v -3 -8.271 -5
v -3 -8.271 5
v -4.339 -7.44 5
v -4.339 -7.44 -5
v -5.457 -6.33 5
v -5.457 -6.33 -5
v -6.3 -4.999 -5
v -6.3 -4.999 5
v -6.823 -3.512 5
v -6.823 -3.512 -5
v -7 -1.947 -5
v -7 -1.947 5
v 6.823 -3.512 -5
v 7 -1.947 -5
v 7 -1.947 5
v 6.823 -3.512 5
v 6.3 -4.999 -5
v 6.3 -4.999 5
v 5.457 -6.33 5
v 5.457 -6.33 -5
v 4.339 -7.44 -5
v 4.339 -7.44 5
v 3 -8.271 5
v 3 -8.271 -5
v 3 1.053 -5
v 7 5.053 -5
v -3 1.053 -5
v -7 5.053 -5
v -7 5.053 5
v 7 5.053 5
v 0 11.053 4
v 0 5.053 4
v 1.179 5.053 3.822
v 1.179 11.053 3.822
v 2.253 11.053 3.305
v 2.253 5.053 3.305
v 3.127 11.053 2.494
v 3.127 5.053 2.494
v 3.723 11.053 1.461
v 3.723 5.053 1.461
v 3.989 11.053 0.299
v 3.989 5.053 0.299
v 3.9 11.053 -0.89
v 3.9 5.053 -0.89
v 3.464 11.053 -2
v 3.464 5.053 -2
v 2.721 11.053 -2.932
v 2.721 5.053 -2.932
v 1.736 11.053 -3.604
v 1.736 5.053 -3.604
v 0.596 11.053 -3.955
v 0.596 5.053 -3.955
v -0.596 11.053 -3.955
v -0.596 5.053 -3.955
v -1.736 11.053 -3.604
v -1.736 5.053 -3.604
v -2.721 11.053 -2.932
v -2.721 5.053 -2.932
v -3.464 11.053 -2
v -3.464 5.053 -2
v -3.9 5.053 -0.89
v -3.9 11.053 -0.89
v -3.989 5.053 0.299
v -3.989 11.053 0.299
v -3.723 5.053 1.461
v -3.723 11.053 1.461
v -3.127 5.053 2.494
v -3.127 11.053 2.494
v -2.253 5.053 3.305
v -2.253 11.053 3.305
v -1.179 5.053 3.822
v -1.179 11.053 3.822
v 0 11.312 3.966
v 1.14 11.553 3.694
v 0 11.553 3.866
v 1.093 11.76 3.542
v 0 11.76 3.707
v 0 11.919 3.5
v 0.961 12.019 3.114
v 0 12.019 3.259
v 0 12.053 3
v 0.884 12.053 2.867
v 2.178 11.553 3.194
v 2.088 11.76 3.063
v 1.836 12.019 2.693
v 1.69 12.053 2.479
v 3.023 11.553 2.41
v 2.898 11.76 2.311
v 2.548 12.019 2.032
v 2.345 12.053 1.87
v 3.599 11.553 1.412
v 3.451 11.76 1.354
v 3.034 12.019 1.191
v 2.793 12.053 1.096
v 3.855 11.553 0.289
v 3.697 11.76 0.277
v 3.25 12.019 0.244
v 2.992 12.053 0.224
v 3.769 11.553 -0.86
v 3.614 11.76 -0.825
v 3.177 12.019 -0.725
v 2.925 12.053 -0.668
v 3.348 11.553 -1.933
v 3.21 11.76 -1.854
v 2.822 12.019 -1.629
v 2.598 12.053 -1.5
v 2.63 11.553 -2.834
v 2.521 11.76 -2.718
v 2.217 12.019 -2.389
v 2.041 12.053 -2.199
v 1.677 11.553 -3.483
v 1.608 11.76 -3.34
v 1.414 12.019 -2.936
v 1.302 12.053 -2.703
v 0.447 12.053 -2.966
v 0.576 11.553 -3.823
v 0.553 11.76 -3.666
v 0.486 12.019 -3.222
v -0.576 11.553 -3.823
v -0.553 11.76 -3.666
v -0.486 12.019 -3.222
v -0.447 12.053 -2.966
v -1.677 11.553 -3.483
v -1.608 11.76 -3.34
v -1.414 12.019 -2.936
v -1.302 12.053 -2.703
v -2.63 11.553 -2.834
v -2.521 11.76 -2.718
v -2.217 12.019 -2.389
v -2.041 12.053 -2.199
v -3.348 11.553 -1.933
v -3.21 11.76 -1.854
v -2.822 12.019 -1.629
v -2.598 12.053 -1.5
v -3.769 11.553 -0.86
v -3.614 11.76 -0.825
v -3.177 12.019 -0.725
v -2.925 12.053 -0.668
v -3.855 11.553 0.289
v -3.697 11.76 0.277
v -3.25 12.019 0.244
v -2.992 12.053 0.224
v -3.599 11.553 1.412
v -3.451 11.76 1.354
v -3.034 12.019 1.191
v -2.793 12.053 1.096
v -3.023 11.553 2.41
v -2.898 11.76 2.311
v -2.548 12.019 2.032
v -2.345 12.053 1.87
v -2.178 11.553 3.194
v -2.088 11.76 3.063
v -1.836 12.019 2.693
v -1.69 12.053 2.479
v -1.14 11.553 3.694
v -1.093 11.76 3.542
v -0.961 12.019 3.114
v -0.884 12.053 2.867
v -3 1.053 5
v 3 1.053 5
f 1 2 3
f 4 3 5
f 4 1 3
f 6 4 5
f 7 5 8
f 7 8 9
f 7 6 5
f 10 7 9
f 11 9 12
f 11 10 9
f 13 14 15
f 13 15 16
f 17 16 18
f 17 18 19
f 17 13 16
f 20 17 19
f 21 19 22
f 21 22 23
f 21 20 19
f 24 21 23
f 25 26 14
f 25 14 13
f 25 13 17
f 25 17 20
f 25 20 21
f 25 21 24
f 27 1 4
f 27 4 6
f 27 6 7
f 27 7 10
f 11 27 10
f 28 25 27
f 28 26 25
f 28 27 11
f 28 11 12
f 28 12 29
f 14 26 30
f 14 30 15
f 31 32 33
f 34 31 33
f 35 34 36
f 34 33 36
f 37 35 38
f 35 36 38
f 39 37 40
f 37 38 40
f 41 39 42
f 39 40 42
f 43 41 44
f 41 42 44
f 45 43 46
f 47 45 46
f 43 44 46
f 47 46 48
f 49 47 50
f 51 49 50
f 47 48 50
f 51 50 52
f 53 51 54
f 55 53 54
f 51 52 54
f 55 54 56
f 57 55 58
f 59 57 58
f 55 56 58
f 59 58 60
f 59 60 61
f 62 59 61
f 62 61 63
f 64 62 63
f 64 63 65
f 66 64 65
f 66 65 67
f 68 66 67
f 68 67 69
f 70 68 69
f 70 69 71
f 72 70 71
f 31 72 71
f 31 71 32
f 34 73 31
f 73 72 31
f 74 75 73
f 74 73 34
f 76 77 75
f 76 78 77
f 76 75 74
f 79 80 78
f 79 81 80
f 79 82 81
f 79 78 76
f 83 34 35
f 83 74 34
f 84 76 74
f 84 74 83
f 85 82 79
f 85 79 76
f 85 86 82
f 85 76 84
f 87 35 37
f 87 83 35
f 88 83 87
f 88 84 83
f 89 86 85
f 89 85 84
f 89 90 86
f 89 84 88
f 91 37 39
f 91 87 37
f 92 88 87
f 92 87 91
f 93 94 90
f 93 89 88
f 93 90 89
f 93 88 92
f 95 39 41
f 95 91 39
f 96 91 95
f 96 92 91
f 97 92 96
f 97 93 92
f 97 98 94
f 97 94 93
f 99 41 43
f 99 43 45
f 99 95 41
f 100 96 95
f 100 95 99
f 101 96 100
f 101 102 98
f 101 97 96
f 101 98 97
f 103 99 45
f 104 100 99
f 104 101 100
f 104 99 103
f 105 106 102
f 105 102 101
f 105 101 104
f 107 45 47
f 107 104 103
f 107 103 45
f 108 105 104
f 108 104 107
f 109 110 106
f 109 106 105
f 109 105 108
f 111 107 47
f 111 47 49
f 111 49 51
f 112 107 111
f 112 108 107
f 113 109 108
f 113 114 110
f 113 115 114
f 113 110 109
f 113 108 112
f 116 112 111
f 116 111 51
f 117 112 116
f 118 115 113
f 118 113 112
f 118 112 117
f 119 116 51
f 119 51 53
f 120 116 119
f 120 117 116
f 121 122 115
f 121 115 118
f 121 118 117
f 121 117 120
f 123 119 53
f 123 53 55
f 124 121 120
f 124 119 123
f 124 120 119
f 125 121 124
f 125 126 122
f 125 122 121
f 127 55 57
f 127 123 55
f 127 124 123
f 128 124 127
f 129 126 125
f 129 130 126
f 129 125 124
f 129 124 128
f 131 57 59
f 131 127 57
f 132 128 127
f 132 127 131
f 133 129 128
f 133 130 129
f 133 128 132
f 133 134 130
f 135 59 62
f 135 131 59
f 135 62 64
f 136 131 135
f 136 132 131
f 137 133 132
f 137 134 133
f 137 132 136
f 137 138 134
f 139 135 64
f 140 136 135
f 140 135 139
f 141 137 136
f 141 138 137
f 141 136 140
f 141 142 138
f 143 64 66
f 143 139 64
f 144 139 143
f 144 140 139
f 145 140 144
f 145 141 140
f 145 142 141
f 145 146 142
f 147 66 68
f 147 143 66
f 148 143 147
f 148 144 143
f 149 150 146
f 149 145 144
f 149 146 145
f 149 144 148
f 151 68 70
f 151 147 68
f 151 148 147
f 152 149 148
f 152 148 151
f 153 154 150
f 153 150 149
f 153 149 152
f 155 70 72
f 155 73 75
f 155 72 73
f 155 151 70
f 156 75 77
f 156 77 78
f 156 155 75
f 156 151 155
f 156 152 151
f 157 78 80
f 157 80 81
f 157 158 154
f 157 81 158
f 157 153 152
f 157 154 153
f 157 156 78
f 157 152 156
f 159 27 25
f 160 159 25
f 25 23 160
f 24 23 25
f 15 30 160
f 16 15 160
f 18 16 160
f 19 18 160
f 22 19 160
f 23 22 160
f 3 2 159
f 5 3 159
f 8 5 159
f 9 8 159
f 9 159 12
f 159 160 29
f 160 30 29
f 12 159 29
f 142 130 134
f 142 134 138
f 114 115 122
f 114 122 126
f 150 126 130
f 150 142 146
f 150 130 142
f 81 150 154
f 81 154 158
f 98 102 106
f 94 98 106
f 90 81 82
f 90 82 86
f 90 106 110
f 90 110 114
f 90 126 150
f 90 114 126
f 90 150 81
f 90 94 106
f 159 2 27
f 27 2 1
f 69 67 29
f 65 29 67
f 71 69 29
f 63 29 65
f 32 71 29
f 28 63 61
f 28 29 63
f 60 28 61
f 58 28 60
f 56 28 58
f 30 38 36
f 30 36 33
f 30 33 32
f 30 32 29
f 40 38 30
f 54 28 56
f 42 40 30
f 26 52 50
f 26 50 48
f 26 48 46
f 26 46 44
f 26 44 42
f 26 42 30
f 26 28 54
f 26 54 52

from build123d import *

# Parameters (mm, degrees)
HAND_DEPTH            = 2.5
HAND_DEPTH_BACK       = 2.5
SKETCH3_R             = 2
WRIST_DEPTH           = 7
FINGER_GAP_DEPTH      = 1.5
FINGER_GAP_DEPTH_BACK = 9.215838363
SKETCH2_W             = 3
SKETCH2_H             = 6
EASY_INSERT_R         = 0.5
SCALE1_SCALE          = 2


with BuildPart() as part:
    # Sketch1 → Hand (new, two sides: drawn at the far end of the back side and taken through both)
    with BuildSketch(Plane.XY.offset(-HAND_DEPTH_BACK)):
        with BuildLine():
            Line((-3.5, 0), (-3.5, 3.5))
            Line((-3.5, 3.5), (3.5, 3.5))
            Line((3.5, 3.5), (3.5, 0))
            ThreePointArc((3.5, 0), (0, -3.5), (-3.5, 0))
        make_face()
    extrude(amount=HAND_DEPTH + HAND_DEPTH_BACK)

    # Sketch3 → Wrist (add)
    with BuildSketch(Plane(origin=(0, 0, 0), x_dir=(1, 0, 0), z_dir=(0, 1, 0))):
        Circle(SKETCH3_R)
    extrude(amount=WRIST_DEPTH)

    # Sketch2 → Finger gap (cut, two sides: drawn at the far end of the back side and taken through both)
    with BuildSketch(Plane(origin=(0, 0, 0), x_dir=(1, 0, 0), z_dir=(0, 1, 0)).offset(-FINGER_GAP_DEPTH_BACK)):
        Rectangle(SKETCH2_W, SKETCH2_H)
    extrude(amount=FINGER_GAP_DEPTH + FINGER_GAP_DEPTH_BACK, mode=Mode.SUBTRACT)

    # Easy insert
    easy_insert_edges = [part.edges().sort_by_distance(p)[0] for p in [
        (-2, 7, 0),
    ]]
    fillet(easy_insert_edges, radius=EASY_INSERT_R)


with BuildPart() as part_1:
    # Scale1: scaled about (0, 1.946660074, 0)
    add(part.part.scale(SCALE1_SCALE).moved(Location((0, -1.946660074, 0))))


solid = part_1.part
